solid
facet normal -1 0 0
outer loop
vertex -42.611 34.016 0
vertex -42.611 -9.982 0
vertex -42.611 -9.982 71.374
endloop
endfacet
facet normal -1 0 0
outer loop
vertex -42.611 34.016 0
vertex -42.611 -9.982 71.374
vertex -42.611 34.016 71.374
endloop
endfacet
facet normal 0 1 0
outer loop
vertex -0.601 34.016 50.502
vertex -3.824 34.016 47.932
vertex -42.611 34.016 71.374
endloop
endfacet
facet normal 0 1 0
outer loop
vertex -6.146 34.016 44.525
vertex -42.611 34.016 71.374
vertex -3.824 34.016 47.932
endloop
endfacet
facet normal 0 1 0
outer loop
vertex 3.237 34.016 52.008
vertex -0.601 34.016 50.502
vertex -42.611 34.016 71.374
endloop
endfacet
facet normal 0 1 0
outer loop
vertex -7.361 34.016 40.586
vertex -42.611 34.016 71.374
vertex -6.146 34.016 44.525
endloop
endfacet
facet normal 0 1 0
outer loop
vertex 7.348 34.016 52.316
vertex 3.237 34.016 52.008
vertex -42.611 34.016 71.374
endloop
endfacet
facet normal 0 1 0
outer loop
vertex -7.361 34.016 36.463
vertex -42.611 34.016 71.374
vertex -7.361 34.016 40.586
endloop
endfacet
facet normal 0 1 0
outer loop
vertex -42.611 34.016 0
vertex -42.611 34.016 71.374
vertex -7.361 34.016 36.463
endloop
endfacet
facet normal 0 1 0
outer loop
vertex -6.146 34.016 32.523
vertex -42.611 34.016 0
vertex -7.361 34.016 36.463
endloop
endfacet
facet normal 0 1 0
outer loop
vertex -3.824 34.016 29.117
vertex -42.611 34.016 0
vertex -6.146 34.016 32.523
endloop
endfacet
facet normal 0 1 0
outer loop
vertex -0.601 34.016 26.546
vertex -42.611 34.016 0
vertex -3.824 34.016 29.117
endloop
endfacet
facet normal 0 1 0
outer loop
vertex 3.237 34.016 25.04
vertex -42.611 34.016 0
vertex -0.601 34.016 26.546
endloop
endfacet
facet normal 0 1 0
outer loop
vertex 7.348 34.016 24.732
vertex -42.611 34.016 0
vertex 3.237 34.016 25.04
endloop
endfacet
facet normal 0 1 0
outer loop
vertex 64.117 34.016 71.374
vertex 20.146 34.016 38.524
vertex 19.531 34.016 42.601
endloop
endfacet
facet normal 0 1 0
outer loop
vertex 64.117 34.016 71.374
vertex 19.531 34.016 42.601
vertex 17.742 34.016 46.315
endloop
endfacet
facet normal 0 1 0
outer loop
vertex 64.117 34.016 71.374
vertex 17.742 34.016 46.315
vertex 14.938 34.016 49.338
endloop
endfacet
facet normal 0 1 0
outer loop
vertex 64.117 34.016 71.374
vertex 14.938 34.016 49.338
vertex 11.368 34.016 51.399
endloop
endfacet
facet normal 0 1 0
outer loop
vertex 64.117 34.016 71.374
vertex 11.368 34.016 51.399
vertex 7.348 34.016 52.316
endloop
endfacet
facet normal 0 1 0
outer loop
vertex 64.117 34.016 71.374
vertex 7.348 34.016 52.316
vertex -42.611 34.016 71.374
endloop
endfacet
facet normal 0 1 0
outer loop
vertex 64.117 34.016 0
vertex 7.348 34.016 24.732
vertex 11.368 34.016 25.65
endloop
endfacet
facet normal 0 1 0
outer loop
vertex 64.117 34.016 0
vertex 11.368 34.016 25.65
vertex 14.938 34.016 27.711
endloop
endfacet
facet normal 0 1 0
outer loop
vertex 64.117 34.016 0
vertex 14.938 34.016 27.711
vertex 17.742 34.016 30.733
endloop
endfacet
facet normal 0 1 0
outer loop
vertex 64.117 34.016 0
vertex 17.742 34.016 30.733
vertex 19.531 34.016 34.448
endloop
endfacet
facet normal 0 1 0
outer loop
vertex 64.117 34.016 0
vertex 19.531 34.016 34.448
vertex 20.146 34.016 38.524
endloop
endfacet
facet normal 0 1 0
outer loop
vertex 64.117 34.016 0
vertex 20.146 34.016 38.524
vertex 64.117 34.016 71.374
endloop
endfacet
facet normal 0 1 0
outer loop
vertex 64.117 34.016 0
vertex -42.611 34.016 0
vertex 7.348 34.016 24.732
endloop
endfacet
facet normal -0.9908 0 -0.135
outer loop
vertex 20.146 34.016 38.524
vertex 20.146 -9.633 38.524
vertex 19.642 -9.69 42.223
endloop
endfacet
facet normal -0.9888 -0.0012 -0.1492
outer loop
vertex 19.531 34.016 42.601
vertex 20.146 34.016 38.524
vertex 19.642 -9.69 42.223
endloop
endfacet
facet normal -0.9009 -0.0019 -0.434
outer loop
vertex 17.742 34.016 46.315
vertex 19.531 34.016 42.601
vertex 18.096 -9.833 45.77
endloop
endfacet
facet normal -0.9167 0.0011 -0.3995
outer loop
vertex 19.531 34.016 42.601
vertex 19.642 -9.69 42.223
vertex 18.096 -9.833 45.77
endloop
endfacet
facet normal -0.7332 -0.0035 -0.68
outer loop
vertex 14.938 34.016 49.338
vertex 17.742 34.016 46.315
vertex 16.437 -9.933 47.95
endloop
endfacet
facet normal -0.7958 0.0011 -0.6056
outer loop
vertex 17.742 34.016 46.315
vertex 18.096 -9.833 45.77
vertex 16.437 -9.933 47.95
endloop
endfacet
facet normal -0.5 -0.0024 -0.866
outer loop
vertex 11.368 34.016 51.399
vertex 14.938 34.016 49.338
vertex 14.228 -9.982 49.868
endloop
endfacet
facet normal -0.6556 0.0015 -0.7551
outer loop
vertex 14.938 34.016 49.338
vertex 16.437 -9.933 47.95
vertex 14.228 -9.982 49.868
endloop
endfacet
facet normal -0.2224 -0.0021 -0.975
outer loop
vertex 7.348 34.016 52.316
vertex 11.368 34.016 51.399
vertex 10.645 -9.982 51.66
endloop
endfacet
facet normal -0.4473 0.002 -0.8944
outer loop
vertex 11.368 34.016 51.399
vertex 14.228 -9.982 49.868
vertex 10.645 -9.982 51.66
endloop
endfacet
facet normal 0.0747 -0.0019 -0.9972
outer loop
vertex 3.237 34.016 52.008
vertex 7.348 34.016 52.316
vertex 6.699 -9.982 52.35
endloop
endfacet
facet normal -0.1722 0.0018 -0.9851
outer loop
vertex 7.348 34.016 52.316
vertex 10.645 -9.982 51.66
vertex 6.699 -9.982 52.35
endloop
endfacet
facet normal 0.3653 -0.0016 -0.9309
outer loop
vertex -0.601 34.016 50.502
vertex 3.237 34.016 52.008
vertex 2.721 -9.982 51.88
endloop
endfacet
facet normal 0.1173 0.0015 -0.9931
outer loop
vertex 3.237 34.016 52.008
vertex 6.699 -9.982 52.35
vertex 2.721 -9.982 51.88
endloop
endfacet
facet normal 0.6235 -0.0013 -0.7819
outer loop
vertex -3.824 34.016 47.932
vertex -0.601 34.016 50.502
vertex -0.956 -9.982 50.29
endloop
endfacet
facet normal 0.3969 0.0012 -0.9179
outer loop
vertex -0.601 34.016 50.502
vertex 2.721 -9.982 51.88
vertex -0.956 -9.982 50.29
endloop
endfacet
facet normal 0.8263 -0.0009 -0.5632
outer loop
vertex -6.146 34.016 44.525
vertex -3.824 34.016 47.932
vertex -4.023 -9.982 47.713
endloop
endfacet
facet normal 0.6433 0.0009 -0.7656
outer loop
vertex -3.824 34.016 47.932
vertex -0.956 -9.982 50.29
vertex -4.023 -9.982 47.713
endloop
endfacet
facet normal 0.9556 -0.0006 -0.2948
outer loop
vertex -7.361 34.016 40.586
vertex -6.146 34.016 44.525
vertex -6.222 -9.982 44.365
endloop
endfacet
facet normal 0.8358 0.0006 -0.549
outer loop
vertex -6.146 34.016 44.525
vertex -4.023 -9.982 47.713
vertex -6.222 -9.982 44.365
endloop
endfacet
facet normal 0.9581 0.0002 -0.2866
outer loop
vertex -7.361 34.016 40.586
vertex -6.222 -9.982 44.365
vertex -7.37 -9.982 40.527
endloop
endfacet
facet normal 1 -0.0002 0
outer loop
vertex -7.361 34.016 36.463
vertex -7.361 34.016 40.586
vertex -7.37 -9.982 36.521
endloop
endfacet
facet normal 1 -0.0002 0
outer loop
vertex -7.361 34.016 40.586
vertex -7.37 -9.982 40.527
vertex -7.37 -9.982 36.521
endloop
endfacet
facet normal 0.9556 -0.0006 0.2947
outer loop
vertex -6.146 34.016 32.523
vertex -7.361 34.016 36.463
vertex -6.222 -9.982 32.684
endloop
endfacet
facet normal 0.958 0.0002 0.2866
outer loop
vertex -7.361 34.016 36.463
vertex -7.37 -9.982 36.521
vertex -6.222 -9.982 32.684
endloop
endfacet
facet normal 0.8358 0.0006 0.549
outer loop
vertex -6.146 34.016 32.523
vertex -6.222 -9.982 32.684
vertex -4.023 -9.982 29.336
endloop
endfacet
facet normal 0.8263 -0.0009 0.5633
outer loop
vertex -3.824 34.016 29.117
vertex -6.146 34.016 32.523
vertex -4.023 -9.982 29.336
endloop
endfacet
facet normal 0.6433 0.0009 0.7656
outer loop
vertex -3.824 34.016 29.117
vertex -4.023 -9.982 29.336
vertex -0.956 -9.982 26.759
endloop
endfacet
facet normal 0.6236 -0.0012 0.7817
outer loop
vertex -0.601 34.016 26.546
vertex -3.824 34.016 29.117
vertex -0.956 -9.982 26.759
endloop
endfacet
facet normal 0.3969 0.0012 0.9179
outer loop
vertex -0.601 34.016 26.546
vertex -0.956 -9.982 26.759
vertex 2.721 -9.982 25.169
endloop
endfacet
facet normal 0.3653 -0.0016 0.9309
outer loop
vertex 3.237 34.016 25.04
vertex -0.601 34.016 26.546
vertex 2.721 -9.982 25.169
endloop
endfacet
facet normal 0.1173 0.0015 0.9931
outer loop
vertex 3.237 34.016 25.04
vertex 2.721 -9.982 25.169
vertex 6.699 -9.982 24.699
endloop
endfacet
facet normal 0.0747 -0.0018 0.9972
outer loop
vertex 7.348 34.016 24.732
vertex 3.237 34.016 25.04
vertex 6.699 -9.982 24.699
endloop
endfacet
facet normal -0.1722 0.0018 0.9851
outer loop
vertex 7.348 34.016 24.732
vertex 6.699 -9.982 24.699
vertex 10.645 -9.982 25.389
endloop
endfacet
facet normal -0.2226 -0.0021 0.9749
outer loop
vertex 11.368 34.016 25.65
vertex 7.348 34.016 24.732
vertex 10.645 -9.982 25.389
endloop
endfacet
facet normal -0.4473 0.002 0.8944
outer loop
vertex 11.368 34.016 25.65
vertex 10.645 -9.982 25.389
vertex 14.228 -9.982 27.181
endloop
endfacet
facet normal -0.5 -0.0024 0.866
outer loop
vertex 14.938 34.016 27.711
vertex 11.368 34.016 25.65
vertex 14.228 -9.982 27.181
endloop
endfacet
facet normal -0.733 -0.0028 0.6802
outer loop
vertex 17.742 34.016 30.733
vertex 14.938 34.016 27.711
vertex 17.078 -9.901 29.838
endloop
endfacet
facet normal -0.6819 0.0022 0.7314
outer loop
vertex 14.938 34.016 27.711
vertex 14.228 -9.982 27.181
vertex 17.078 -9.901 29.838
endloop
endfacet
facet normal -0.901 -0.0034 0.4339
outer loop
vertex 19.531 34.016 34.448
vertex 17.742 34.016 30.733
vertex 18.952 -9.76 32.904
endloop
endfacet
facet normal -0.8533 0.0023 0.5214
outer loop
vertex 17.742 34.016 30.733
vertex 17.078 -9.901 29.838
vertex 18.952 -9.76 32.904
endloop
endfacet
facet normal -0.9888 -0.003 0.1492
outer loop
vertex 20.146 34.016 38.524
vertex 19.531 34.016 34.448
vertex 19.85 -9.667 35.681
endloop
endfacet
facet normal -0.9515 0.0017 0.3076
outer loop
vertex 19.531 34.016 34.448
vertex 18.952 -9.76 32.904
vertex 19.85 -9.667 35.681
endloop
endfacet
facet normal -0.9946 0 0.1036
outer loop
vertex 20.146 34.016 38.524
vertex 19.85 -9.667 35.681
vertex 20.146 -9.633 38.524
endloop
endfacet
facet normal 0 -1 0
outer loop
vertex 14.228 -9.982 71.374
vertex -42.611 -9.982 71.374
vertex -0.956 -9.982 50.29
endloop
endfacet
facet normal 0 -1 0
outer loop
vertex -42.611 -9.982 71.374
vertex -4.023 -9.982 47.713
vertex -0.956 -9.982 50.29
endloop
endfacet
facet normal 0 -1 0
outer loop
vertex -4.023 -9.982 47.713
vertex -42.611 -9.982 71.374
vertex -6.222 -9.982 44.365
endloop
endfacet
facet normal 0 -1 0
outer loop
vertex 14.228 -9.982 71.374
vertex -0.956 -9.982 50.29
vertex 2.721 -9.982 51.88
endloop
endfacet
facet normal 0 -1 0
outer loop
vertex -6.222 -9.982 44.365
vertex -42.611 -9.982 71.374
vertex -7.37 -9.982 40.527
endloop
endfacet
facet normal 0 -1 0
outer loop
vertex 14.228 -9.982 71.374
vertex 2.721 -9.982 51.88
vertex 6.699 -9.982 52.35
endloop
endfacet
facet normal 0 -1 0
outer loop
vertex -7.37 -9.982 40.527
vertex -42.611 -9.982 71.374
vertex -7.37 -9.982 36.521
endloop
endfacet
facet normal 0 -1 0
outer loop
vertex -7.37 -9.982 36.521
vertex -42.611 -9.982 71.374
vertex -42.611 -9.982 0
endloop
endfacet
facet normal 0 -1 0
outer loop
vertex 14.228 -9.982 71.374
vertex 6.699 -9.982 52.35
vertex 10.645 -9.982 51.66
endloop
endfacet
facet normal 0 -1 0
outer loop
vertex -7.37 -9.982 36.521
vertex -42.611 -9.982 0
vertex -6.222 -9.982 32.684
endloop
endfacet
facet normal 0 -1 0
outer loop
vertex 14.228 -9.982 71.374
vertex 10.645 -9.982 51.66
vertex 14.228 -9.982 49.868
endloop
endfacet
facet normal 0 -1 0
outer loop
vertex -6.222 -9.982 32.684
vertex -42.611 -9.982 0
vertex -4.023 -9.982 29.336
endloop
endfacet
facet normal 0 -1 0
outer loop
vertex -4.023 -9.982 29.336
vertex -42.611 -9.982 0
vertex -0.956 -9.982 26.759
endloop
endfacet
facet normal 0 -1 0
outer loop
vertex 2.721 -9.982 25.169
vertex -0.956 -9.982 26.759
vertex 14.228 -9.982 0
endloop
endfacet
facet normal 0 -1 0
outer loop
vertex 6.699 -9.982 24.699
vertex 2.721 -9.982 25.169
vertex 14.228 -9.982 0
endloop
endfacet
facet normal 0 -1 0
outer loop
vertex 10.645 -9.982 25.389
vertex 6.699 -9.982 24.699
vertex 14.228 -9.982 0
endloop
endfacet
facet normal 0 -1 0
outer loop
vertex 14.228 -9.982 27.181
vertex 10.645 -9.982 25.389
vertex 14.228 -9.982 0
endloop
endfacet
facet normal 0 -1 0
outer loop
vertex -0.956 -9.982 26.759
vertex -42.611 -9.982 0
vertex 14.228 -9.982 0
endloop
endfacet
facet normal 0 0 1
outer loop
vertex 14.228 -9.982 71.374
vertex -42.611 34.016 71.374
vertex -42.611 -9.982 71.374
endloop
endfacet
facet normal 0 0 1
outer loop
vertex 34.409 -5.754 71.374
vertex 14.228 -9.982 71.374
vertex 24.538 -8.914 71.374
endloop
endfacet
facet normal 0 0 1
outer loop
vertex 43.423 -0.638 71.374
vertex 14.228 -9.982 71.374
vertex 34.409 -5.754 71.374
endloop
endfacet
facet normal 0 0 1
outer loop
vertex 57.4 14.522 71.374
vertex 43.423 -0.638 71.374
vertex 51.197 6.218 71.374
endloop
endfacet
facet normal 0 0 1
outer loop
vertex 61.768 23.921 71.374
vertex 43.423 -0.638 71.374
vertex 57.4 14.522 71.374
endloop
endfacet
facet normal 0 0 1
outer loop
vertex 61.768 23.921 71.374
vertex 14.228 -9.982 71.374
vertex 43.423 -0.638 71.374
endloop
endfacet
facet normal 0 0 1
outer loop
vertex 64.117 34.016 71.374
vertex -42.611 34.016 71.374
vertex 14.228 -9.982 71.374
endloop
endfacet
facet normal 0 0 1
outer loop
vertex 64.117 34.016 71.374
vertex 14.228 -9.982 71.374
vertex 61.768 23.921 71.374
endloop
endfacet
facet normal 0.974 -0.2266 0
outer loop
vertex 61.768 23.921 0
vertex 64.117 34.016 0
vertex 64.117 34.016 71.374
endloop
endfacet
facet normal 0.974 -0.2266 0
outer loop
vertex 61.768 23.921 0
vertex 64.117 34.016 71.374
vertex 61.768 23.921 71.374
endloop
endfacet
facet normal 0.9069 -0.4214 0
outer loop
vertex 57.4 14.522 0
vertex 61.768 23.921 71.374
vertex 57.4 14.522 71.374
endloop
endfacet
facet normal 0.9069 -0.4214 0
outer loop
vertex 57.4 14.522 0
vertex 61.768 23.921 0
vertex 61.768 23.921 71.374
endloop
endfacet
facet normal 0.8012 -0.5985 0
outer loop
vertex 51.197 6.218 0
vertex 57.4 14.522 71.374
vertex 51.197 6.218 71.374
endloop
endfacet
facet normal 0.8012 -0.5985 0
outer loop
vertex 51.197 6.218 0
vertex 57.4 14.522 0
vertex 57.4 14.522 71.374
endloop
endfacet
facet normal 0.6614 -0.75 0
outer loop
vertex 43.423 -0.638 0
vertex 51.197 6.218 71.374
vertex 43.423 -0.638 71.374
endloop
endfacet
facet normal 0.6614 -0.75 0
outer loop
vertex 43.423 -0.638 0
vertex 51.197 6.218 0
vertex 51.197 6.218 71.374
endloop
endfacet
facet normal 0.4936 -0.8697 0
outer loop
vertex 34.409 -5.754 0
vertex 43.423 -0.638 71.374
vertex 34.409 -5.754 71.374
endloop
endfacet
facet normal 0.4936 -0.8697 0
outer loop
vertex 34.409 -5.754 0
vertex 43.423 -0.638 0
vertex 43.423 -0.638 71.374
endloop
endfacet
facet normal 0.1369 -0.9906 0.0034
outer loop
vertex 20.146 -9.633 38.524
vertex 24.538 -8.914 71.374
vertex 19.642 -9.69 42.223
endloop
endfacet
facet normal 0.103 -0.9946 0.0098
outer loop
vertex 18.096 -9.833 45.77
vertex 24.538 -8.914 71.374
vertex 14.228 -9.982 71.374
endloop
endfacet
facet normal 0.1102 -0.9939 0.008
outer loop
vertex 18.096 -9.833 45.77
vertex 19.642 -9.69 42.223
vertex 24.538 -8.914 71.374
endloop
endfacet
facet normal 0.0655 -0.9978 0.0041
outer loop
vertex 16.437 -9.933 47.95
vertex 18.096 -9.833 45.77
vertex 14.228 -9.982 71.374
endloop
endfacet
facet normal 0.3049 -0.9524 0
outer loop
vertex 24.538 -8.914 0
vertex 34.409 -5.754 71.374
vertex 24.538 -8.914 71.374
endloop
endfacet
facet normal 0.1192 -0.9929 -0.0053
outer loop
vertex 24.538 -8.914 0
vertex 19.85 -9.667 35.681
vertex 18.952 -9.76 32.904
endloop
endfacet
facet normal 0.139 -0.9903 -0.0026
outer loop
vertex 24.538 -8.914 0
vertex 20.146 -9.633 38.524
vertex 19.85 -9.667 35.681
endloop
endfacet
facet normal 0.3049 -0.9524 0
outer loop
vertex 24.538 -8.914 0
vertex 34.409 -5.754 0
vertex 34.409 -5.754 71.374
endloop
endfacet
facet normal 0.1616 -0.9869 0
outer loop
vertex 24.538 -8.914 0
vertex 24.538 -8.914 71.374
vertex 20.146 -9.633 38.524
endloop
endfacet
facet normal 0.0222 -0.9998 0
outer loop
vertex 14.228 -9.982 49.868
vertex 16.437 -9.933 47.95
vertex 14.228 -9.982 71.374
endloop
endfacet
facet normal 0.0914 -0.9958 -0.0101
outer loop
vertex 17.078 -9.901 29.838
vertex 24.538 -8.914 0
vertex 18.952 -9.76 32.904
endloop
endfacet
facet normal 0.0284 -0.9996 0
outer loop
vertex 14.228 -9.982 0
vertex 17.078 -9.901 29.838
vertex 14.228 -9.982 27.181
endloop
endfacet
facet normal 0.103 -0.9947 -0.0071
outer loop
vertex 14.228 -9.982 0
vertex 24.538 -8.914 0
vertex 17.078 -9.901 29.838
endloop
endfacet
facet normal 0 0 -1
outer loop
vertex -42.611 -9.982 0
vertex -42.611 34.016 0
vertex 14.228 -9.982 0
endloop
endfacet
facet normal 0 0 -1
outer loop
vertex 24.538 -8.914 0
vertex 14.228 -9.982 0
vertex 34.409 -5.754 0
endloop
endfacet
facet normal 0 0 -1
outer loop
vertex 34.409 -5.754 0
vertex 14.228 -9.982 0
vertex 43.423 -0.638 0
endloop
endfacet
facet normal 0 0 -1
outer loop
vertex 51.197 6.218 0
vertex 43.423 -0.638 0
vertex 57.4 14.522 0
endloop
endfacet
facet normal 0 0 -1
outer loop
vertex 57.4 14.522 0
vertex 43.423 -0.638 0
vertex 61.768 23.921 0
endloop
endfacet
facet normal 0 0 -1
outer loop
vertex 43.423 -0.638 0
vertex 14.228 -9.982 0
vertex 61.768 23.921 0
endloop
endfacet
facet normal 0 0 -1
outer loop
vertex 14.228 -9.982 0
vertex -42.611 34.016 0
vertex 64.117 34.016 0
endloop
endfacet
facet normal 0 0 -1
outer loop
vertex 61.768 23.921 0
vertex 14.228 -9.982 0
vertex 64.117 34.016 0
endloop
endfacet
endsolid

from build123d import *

# Parameters (mm, degrees)
F0_W        = 106.7279540002
F0_H        = 43.9982321113
F1_DEPTH    = 71.374
F2_R        = 13.8308303795
F3_DEPTH    = 43.9982321113
F4_T1_DEPTH = 320.8185282784


# Not quite as in the source:
# - a fillet or chamfer that OpenCascade refuses, or shapes differently, is made with other operations: its cross-section is extruded or revolved along the edge and cut away or added


with BuildPart() as f1:
    # F0 (on Top) → F1 (new body)
    with BuildSketch(Plane.XY):
        with Locations((10.7528511435, 12.0171392336)):
            Rectangle(F0_W, F0_H)
    extrude(amount=F1_DEPTH)

    # F2 (on face) → F3 (cut, through all)
    with BuildSketch(Plane.XZ.offset(9.981976822)):
        with Locations((6.3148764893, 38.5243110359)):
            Circle(F2_R)
    extrude(amount=-F3_DEPTH, mode=Mode.SUBTRACT)

    # F4: fillet of radius 50.2832400771 on 1 edges, made by hand

    # F4_s2 → F4_t1 (cut)
    with BuildSketch(Plane.XY.offset(-124.7222641392)):
        with BuildLine():
            ThreePointArc((64.1168281436, 34.0162552893), (47.4873096457, 2.5889655454), (14.2279224879, -9.981976822))
            Line((14.2279224879, -9.981976822), (64.1168281436, -9.981976822))
            Line((64.1168281436, -9.981976822), (64.1168281436, 34.0162552893))
        make_face()
    extrude(amount=F4_T1_DEPTH, mode=Mode.SUBTRACT)


solid = f1.part
